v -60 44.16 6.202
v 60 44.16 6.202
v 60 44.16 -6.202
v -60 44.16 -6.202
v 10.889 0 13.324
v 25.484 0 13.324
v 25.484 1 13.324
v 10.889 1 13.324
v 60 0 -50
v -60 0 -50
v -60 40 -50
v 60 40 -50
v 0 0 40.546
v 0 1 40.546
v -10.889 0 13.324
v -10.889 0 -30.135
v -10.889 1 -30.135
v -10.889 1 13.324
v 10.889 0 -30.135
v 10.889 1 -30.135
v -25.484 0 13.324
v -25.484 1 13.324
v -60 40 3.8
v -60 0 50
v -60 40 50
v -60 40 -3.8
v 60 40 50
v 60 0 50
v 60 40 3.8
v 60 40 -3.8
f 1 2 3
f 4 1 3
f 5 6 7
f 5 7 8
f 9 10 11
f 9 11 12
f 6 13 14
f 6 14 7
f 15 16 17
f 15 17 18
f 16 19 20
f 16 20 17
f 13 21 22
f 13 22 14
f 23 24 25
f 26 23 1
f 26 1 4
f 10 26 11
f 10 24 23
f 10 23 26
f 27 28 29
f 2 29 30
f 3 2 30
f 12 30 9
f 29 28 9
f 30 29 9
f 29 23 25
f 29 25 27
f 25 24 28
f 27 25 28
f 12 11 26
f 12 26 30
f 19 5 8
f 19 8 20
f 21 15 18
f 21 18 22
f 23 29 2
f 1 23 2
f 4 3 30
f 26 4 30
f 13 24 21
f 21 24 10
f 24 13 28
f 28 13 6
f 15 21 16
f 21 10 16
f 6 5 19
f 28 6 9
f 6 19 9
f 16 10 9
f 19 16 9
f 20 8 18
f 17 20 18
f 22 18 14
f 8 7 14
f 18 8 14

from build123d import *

# Parameters (mm, degrees)
SKETCH1_W           = 120
SKETCH1_H           = 100
BOSS_EXTRUDE1_DEPTH = 40
BOSS_EXTRUDE2_DEPTH = 120
CUT_EXTRUDE2_DEPTH  = 1


with BuildPart() as part:
    # Sketch1 → Boss-Extrude1 (new body)
    with BuildSketch(Plane(origin=(0, 0, 0), x_dir=(1, 0, 0), z_dir=(0, 1, 0))):
        Rectangle(SKETCH1_W, SKETCH1_H)
    extrude(amount=BOSS_EXTRUDE1_DEPTH)

    # Sketch2 → Boss-Extrude2 (add)
    with BuildSketch(Plane(origin=(60, 0, 0), x_dir=(0, 0, -1), z_dir=(1, 0, 0))):
        Polygon((-3.8, 40), (-6.20177712, 44.16), (6.20177712, 44.16), (3.8, 40), align=None)
    extrude(amount=-BOSS_EXTRUDE2_DEPTH)

    # Sketch5 → Cut-Extrude2 (cut)
    with BuildSketch(Plane.XZ):
        Polygon((-10.888743303, -30.135074667), (-10.888743303, 13.324383252), (-25.483702069, 13.324383252), (0, 40.546241509), (25.483702069, 13.324383252), (10.888743303, 13.324383252), (10.888743303, -30.135074667), align=None)
    extrude(amount=-CUT_EXTRUDE2_DEPTH, mode=Mode.SUBTRACT)


solid = part.part
